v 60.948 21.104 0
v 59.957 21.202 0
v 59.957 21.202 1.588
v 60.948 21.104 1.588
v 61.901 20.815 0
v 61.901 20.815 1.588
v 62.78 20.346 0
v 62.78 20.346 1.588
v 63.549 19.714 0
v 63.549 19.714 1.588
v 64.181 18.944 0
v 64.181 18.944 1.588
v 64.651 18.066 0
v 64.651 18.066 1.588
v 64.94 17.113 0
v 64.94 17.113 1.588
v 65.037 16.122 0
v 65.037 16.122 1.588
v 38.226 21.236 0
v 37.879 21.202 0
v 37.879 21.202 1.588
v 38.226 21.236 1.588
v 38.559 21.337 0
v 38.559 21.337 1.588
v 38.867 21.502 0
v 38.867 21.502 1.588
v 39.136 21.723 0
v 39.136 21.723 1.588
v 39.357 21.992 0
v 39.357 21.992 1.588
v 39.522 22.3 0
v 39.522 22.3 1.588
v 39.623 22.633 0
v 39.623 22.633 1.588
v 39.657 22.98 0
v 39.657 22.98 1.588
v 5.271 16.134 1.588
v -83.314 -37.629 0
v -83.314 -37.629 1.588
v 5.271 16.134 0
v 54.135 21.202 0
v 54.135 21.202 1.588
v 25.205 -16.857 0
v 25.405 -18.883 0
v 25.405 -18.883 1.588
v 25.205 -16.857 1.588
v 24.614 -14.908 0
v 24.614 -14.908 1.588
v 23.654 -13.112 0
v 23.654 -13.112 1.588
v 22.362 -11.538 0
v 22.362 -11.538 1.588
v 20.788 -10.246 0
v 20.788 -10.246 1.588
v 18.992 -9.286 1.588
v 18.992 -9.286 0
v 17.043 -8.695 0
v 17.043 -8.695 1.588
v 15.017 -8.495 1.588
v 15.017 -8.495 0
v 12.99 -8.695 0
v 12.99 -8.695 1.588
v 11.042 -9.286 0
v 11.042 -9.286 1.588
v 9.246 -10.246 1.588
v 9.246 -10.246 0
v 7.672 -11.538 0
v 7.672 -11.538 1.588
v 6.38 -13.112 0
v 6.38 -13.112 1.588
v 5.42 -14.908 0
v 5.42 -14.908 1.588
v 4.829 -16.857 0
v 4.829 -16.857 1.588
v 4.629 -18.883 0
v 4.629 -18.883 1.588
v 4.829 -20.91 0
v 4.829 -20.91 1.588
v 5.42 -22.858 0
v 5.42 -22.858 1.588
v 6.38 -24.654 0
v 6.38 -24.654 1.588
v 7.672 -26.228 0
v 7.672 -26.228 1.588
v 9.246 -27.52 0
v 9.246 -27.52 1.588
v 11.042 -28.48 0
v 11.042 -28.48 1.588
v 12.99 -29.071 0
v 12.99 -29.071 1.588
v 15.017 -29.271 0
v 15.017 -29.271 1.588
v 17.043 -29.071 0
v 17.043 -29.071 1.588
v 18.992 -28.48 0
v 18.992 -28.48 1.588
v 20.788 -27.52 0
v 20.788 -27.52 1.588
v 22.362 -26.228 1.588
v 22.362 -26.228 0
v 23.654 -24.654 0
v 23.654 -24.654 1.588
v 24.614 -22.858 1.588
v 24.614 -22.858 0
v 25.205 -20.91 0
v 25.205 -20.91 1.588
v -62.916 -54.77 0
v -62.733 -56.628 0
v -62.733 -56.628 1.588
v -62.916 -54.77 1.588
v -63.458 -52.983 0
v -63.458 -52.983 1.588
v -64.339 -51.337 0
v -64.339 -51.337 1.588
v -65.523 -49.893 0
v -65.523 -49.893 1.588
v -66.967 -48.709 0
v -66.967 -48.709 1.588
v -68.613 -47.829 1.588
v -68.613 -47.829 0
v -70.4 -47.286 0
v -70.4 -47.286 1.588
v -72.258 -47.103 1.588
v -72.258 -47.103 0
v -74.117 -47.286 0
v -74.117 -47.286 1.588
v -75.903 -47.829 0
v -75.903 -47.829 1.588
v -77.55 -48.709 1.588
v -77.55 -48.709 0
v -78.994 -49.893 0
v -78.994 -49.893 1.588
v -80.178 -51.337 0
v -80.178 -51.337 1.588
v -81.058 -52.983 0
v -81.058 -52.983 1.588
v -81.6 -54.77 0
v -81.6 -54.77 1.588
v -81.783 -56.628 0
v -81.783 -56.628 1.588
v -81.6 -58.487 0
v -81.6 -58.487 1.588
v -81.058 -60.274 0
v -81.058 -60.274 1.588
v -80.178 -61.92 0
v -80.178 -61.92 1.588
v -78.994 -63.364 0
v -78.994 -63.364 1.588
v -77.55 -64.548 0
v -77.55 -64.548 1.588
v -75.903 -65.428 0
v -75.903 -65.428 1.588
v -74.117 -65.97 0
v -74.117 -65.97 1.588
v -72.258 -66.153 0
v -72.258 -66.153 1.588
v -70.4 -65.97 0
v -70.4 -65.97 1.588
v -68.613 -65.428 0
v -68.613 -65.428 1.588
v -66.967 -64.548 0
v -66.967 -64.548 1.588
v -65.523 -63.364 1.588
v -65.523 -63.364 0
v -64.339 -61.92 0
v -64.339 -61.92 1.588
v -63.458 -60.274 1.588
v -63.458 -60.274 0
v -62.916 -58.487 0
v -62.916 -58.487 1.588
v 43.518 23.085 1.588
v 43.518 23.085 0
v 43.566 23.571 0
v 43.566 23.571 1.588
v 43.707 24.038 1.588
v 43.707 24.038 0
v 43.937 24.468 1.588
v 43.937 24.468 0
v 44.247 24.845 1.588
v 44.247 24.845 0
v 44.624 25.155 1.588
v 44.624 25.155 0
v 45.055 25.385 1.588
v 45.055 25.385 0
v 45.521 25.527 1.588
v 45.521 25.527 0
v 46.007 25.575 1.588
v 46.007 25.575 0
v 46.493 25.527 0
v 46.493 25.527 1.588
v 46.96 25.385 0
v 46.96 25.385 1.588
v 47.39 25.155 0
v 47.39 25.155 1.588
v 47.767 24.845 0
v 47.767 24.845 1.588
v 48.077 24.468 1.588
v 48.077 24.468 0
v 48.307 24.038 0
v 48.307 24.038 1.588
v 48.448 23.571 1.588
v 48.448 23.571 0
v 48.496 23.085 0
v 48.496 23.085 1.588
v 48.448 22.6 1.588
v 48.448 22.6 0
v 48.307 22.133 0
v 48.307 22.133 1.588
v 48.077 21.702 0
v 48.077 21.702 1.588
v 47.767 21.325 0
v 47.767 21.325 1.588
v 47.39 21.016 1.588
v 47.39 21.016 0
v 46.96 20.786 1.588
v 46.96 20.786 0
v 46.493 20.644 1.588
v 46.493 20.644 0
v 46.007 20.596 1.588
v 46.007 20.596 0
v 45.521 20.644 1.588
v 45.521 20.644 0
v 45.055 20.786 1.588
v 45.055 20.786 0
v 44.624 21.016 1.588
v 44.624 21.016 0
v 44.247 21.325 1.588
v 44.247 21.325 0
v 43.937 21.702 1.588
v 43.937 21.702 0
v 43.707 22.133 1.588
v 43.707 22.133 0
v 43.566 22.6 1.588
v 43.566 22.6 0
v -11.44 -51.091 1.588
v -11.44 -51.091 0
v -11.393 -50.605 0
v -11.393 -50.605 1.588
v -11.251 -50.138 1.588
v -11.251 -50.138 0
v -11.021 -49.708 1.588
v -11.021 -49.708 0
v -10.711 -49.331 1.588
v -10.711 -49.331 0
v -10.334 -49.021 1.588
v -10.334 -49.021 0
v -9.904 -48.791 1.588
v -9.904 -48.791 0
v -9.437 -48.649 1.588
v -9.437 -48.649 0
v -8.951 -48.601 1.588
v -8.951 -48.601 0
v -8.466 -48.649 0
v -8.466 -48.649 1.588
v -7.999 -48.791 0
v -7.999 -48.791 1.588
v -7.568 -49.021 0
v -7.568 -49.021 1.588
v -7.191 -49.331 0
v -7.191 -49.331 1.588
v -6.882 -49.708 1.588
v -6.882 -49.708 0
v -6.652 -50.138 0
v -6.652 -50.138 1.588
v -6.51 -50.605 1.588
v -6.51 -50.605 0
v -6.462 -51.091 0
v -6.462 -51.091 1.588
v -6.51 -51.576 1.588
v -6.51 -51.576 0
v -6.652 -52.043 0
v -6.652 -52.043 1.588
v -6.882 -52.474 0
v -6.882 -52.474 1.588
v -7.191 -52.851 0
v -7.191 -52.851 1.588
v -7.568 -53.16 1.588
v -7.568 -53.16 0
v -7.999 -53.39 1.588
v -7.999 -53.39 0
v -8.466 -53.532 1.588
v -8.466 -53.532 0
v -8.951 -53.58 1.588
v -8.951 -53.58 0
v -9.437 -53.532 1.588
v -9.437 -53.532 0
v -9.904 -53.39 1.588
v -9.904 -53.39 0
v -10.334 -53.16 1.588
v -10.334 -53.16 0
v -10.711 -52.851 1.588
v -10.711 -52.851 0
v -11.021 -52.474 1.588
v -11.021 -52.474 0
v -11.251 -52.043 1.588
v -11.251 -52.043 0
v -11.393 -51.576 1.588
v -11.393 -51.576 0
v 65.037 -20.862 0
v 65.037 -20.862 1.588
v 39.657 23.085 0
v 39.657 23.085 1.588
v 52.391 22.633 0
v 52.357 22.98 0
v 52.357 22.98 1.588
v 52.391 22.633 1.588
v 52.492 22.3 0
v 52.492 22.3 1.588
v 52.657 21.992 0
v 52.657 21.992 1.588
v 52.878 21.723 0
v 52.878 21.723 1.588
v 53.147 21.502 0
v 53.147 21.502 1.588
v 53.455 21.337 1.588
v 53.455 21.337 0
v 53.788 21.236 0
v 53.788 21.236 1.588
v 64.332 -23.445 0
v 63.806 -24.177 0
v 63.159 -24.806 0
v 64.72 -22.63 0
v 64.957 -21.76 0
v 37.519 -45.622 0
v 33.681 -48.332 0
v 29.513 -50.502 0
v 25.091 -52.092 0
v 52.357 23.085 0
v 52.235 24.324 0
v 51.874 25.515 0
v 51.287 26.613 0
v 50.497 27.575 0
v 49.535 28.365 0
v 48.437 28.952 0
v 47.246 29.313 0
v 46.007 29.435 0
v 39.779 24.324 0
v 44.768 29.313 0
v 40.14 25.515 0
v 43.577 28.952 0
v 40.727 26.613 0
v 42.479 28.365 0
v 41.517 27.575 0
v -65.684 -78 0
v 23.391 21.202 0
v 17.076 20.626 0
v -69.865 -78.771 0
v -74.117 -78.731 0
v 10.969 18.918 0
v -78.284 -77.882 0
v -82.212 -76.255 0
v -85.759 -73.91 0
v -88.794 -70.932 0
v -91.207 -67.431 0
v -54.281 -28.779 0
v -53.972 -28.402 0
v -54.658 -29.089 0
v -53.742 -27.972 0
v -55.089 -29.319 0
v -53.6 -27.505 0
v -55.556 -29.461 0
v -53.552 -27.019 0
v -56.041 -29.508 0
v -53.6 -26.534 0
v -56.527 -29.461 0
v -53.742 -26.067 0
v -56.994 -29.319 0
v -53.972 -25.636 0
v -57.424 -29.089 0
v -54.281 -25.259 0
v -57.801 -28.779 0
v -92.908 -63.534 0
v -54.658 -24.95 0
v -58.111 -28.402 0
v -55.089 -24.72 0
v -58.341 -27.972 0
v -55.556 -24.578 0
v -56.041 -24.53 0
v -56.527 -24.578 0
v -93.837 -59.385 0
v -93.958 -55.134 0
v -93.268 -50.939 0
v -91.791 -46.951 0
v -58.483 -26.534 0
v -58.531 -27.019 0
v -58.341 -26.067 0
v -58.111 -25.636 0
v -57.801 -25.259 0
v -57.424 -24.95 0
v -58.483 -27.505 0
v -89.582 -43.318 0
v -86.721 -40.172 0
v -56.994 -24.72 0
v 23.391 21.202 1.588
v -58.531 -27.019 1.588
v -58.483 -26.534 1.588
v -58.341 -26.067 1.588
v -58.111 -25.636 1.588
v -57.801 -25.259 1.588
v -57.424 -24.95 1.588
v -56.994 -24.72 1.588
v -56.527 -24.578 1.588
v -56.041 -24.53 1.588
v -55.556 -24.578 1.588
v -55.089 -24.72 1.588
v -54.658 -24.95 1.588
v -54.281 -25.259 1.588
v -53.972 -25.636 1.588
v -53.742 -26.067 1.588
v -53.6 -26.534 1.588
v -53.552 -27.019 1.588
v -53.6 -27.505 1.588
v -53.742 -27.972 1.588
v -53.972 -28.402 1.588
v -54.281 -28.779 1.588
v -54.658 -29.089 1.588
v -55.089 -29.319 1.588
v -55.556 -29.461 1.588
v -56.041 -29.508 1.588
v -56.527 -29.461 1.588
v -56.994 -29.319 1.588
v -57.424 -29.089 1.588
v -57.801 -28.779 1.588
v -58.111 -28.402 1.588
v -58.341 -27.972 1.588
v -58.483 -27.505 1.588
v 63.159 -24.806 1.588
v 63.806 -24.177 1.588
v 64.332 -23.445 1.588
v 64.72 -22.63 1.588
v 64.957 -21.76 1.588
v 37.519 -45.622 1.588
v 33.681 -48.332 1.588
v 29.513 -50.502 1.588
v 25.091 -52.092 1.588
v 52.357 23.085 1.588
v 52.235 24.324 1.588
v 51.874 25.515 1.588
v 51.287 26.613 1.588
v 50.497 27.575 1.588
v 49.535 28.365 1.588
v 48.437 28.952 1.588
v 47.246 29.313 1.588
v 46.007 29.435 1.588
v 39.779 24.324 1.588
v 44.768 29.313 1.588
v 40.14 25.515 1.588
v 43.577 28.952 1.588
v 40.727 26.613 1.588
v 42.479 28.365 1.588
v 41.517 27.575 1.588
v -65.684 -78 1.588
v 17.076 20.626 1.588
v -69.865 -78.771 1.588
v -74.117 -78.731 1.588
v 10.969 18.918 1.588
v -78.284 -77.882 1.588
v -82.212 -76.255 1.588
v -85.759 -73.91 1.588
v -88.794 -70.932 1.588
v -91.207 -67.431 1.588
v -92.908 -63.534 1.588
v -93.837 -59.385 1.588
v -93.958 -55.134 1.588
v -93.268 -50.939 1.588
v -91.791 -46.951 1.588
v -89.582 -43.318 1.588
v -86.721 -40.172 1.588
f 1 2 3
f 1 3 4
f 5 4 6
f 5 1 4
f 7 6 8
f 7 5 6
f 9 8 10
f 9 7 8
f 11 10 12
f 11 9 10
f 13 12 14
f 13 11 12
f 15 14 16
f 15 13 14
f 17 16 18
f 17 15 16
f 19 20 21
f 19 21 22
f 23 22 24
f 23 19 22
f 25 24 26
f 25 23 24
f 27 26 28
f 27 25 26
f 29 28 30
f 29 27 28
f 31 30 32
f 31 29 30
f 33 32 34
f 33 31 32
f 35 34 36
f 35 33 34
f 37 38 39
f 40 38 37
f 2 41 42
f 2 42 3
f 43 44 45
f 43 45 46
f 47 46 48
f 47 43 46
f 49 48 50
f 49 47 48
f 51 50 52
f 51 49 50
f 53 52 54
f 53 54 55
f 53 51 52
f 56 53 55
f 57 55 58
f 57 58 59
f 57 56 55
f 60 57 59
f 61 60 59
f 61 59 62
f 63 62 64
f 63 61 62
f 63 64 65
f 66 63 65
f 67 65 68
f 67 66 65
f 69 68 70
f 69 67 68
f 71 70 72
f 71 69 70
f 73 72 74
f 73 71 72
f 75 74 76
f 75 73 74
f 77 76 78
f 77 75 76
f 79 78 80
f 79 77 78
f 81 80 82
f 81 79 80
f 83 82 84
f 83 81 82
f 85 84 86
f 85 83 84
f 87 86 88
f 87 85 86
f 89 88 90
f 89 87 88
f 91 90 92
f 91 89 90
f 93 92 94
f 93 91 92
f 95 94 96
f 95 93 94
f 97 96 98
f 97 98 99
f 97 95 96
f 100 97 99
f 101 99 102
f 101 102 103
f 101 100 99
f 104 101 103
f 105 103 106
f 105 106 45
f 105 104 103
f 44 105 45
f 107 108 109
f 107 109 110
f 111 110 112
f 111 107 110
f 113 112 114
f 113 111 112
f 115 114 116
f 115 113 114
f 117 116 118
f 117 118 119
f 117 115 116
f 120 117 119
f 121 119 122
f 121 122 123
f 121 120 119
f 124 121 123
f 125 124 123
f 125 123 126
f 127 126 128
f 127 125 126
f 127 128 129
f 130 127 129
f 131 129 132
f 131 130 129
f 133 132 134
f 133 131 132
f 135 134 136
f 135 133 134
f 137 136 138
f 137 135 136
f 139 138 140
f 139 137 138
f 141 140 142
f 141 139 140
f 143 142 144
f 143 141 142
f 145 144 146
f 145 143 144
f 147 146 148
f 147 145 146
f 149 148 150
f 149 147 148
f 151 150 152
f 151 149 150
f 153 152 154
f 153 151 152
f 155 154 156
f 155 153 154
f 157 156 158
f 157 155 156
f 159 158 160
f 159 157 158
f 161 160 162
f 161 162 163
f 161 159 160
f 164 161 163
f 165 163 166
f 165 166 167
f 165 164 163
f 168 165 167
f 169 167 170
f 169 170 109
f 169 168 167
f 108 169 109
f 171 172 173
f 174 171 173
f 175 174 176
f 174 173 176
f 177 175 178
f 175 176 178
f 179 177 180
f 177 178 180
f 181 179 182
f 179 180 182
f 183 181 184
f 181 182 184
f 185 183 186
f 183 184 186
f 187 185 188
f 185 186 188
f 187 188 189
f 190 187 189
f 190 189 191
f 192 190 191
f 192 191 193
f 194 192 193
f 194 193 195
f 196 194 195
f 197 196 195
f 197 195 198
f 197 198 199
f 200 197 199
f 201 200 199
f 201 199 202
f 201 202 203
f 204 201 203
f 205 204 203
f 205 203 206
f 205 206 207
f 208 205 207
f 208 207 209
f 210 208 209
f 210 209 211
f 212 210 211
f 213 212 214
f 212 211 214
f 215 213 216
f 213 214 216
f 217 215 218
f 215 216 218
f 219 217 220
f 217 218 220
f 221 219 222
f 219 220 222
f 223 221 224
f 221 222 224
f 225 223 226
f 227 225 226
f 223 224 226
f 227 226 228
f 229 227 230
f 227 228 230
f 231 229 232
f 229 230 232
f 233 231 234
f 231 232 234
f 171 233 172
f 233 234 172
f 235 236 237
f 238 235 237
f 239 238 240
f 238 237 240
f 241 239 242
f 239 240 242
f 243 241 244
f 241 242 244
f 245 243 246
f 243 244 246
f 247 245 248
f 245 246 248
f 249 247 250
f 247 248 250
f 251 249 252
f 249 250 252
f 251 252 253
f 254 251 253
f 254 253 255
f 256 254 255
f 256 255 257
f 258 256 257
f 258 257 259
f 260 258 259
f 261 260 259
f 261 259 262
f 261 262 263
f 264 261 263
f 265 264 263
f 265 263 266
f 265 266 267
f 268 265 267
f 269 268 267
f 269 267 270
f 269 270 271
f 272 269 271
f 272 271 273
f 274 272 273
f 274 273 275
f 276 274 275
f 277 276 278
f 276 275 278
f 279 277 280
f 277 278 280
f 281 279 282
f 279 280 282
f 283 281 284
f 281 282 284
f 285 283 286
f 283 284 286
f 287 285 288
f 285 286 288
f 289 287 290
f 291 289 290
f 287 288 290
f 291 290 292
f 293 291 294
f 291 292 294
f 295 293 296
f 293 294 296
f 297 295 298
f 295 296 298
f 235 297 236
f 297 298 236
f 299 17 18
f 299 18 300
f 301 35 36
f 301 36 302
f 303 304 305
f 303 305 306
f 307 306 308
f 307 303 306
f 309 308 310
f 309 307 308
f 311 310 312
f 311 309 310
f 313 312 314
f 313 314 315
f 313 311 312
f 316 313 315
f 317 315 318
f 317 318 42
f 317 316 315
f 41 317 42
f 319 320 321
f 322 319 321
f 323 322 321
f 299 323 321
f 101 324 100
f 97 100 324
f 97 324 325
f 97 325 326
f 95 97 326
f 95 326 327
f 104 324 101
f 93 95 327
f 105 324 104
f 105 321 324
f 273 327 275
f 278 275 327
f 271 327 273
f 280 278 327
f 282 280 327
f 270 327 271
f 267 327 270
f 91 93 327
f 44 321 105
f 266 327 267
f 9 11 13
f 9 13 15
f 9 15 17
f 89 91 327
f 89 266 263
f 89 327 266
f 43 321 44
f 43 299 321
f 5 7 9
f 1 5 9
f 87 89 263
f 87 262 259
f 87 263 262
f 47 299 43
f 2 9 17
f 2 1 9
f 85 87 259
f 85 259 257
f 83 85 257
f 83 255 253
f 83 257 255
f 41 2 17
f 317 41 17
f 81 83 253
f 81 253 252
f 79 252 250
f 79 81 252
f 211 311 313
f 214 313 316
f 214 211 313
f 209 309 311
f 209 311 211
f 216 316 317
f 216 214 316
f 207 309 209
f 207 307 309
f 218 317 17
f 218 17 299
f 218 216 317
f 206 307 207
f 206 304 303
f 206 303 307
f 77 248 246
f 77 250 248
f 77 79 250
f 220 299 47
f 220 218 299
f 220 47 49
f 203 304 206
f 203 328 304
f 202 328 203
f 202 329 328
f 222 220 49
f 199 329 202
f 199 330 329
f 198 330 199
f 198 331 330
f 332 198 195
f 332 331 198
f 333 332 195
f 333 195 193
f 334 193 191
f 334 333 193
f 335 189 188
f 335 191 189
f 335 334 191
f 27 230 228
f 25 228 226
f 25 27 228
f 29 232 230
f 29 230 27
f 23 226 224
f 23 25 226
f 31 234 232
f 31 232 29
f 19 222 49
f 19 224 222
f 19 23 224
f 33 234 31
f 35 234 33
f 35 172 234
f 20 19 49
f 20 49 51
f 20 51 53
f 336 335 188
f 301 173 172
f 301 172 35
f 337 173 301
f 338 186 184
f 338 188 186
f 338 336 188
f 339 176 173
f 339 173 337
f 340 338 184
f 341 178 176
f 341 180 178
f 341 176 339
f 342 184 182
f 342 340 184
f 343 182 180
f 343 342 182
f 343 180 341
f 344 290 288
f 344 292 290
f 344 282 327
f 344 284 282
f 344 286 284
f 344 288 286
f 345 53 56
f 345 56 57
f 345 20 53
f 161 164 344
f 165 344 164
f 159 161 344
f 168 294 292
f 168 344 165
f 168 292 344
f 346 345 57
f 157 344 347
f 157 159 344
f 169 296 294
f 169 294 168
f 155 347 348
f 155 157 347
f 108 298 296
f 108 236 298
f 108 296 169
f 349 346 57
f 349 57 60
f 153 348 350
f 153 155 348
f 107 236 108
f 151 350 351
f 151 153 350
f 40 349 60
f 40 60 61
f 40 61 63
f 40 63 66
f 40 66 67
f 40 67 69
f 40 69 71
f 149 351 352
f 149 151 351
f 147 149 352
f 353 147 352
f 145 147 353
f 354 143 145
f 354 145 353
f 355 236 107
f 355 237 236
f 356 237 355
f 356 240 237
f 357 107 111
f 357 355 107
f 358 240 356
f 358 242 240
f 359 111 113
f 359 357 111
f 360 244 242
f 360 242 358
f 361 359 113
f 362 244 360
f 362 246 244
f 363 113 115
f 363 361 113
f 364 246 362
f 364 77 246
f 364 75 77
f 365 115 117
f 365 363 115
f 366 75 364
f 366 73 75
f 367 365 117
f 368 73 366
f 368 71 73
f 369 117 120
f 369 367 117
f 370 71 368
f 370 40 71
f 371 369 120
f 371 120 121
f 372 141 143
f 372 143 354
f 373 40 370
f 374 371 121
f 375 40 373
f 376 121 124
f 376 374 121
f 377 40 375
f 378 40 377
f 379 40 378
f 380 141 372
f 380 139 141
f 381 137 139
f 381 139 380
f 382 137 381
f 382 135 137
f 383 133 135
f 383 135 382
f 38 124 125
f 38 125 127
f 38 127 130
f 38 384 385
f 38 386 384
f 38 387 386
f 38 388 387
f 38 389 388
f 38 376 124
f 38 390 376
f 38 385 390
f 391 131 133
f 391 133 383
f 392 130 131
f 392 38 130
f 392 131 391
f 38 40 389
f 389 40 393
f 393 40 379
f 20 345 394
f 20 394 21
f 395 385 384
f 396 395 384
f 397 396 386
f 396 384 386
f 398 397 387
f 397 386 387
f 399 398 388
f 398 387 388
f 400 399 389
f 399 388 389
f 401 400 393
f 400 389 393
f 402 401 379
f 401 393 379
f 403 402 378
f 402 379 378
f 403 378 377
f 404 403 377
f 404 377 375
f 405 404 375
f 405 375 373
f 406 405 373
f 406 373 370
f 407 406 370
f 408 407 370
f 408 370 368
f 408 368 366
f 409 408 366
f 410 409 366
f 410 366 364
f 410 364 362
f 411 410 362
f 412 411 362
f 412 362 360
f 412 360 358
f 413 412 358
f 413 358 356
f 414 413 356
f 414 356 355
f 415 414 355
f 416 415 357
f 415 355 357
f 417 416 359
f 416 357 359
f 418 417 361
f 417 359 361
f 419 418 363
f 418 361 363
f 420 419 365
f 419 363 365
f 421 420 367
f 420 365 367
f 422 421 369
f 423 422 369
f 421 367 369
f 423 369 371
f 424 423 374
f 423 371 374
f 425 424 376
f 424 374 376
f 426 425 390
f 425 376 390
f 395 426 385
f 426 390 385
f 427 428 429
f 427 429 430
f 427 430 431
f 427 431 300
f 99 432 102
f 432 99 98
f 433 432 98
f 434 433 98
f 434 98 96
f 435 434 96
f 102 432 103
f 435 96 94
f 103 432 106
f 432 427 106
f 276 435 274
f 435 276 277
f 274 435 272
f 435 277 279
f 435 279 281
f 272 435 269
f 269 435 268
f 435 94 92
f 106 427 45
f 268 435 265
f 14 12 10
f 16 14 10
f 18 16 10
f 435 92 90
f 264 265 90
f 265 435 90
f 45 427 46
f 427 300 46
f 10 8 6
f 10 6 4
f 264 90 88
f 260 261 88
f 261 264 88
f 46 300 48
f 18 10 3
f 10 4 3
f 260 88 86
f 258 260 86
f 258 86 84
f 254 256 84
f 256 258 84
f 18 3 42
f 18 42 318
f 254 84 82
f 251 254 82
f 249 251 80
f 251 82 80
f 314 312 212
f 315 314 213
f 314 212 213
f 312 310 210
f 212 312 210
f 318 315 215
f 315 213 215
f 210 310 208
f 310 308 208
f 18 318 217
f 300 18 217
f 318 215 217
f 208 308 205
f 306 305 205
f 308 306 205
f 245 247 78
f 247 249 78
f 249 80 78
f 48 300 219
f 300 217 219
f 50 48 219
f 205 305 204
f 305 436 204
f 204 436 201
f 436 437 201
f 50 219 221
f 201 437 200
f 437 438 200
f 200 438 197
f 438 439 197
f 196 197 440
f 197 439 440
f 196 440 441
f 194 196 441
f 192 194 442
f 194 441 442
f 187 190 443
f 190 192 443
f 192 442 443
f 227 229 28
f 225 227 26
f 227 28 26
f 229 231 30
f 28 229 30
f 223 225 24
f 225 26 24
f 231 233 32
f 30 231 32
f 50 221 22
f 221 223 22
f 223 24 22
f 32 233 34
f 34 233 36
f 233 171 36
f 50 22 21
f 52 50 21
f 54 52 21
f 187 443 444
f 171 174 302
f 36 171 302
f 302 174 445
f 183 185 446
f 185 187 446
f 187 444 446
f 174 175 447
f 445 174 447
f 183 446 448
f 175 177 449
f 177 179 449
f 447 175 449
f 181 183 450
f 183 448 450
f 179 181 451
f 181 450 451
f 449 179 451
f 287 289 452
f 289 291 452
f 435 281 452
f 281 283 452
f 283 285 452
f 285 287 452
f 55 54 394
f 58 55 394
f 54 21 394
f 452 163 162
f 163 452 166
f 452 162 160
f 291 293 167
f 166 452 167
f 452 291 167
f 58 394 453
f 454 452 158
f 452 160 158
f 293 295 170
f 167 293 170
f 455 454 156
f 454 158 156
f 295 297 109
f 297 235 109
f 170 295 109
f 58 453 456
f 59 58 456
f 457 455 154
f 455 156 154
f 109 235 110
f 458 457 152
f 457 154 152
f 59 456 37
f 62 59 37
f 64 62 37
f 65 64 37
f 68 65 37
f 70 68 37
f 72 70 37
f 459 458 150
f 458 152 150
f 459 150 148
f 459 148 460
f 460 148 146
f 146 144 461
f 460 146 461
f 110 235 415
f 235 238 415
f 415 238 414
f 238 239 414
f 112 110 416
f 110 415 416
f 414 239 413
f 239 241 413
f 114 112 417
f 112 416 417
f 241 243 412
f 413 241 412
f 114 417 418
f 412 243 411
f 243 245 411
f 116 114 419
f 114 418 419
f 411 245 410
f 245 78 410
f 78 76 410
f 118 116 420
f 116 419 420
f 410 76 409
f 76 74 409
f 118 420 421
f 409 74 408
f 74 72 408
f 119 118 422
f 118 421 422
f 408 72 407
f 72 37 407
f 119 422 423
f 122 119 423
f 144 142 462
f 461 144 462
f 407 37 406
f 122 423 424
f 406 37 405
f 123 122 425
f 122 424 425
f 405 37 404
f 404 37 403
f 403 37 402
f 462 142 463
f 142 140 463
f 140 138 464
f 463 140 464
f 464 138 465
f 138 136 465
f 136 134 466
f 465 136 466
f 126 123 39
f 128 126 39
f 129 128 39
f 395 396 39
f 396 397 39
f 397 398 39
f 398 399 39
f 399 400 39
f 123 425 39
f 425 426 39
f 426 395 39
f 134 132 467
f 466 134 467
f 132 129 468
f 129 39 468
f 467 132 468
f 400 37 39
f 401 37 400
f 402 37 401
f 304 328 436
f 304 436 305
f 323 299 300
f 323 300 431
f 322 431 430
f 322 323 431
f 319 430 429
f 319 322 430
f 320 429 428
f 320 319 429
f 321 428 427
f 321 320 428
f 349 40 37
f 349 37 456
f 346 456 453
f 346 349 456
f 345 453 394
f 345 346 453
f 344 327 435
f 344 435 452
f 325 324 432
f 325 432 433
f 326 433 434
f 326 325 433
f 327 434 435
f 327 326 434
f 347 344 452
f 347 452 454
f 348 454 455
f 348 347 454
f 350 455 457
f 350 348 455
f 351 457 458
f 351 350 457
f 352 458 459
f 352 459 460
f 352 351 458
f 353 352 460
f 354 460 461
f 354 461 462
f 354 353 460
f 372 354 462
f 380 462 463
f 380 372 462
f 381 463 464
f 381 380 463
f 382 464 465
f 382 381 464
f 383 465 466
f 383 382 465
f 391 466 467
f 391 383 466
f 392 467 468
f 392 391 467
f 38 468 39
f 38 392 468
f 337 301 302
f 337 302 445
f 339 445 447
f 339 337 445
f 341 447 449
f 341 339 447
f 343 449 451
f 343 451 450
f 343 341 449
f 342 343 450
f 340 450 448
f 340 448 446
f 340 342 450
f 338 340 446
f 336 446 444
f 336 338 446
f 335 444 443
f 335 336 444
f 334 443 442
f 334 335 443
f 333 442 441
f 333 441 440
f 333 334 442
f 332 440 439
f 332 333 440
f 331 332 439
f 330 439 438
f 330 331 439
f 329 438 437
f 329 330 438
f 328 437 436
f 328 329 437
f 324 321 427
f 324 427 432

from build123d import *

# Parameters (mm, degrees)
SKETCH2_R              = 10.387693019
SKETCH2_R_2            = 9.525
BOSS_EXTRUDE1_DEPTH    = 1.5875
F_10_CLEARANCE_HOLE1_D = 4.9784


with BuildPart() as part:
    # Sketch2 → Boss-Extrude1 (new body)
    with BuildSketch(Plane.XY):
        with BuildLine():
            Line((25.091057906, -52.092444741), (-65.683756135, -78.000081372))
            ThreePointArc((-65.683756135, -78.000081372), (-92.150845981, -65.52313309), (-83.314246567, -37.628768173))
            Line((-83.314246567, -37.628768173), (5.271270971, 16.133758159))
            ThreePointArc((5.271270971, 16.133758159), (13.983534085, 19.911144202), (23.391278089, 21.202084415))
            Line((23.391278089, 21.202084415), (37.879087429, 21.202084415))
            ThreePointArc((37.879087429, 21.202084415), (39.136323286, 21.722848558), (39.657087429, 22.980084415))
            Line((39.657087429, 22.980084415), (39.657087429, 23.085322173))
            ThreePointArc((39.657087429, 23.085322173), (46.007087429, 29.435322173), (52.357087429, 23.085322173))
            Line((52.357087429, 23.085322173), (52.357087429, 22.980084415))
            ThreePointArc((52.357087429, 22.980084415), (52.877851572, 21.722848558), (54.135087429, 21.202084415))
            Line((54.135087429, 21.202084415), (59.957258632, 21.202084415))
            ThreePointArc((59.957258632, 21.202084415), (63.54936108, 19.714186863), (65.037258632, 16.122084415))
            Line((65.037258632, 16.122084415), (65.037258632, -20.861923216))
            ThreePointArc((65.037258632, -20.861923216), (64.543779313, -23.046008387), (63.159216098, -24.805762511))
            Line((63.159216098, -24.805762511), (37.51946621, -45.622378614))
            ThreePointArc((37.51946621, -45.622378614), (31.63306192, -49.487085384), (25.091057906, -52.092444741))
        make_face()
        with Locations((15.016809712, -18.883068303)):
            Circle(SKETCH2_R, mode=Mode.SUBTRACT)
        with Locations((-72.258332946, -56.628468385)):
            Circle(SKETCH2_R_2, mode=Mode.SUBTRACT)
    extrude(amount=BOSS_EXTRUDE1_DEPTH)

    # #10 Clearance Hole1 (through all)
    with Locations(Plane.XY.offset(1.5875)):
        with Locations((-56.041369259, -27.019222928), (-8.951277081, -51.090630662), (46.007087429, 23.085322173)):
            Hole(F_10_CLEARANCE_HOLE1_D / 2)


solid = part.part
